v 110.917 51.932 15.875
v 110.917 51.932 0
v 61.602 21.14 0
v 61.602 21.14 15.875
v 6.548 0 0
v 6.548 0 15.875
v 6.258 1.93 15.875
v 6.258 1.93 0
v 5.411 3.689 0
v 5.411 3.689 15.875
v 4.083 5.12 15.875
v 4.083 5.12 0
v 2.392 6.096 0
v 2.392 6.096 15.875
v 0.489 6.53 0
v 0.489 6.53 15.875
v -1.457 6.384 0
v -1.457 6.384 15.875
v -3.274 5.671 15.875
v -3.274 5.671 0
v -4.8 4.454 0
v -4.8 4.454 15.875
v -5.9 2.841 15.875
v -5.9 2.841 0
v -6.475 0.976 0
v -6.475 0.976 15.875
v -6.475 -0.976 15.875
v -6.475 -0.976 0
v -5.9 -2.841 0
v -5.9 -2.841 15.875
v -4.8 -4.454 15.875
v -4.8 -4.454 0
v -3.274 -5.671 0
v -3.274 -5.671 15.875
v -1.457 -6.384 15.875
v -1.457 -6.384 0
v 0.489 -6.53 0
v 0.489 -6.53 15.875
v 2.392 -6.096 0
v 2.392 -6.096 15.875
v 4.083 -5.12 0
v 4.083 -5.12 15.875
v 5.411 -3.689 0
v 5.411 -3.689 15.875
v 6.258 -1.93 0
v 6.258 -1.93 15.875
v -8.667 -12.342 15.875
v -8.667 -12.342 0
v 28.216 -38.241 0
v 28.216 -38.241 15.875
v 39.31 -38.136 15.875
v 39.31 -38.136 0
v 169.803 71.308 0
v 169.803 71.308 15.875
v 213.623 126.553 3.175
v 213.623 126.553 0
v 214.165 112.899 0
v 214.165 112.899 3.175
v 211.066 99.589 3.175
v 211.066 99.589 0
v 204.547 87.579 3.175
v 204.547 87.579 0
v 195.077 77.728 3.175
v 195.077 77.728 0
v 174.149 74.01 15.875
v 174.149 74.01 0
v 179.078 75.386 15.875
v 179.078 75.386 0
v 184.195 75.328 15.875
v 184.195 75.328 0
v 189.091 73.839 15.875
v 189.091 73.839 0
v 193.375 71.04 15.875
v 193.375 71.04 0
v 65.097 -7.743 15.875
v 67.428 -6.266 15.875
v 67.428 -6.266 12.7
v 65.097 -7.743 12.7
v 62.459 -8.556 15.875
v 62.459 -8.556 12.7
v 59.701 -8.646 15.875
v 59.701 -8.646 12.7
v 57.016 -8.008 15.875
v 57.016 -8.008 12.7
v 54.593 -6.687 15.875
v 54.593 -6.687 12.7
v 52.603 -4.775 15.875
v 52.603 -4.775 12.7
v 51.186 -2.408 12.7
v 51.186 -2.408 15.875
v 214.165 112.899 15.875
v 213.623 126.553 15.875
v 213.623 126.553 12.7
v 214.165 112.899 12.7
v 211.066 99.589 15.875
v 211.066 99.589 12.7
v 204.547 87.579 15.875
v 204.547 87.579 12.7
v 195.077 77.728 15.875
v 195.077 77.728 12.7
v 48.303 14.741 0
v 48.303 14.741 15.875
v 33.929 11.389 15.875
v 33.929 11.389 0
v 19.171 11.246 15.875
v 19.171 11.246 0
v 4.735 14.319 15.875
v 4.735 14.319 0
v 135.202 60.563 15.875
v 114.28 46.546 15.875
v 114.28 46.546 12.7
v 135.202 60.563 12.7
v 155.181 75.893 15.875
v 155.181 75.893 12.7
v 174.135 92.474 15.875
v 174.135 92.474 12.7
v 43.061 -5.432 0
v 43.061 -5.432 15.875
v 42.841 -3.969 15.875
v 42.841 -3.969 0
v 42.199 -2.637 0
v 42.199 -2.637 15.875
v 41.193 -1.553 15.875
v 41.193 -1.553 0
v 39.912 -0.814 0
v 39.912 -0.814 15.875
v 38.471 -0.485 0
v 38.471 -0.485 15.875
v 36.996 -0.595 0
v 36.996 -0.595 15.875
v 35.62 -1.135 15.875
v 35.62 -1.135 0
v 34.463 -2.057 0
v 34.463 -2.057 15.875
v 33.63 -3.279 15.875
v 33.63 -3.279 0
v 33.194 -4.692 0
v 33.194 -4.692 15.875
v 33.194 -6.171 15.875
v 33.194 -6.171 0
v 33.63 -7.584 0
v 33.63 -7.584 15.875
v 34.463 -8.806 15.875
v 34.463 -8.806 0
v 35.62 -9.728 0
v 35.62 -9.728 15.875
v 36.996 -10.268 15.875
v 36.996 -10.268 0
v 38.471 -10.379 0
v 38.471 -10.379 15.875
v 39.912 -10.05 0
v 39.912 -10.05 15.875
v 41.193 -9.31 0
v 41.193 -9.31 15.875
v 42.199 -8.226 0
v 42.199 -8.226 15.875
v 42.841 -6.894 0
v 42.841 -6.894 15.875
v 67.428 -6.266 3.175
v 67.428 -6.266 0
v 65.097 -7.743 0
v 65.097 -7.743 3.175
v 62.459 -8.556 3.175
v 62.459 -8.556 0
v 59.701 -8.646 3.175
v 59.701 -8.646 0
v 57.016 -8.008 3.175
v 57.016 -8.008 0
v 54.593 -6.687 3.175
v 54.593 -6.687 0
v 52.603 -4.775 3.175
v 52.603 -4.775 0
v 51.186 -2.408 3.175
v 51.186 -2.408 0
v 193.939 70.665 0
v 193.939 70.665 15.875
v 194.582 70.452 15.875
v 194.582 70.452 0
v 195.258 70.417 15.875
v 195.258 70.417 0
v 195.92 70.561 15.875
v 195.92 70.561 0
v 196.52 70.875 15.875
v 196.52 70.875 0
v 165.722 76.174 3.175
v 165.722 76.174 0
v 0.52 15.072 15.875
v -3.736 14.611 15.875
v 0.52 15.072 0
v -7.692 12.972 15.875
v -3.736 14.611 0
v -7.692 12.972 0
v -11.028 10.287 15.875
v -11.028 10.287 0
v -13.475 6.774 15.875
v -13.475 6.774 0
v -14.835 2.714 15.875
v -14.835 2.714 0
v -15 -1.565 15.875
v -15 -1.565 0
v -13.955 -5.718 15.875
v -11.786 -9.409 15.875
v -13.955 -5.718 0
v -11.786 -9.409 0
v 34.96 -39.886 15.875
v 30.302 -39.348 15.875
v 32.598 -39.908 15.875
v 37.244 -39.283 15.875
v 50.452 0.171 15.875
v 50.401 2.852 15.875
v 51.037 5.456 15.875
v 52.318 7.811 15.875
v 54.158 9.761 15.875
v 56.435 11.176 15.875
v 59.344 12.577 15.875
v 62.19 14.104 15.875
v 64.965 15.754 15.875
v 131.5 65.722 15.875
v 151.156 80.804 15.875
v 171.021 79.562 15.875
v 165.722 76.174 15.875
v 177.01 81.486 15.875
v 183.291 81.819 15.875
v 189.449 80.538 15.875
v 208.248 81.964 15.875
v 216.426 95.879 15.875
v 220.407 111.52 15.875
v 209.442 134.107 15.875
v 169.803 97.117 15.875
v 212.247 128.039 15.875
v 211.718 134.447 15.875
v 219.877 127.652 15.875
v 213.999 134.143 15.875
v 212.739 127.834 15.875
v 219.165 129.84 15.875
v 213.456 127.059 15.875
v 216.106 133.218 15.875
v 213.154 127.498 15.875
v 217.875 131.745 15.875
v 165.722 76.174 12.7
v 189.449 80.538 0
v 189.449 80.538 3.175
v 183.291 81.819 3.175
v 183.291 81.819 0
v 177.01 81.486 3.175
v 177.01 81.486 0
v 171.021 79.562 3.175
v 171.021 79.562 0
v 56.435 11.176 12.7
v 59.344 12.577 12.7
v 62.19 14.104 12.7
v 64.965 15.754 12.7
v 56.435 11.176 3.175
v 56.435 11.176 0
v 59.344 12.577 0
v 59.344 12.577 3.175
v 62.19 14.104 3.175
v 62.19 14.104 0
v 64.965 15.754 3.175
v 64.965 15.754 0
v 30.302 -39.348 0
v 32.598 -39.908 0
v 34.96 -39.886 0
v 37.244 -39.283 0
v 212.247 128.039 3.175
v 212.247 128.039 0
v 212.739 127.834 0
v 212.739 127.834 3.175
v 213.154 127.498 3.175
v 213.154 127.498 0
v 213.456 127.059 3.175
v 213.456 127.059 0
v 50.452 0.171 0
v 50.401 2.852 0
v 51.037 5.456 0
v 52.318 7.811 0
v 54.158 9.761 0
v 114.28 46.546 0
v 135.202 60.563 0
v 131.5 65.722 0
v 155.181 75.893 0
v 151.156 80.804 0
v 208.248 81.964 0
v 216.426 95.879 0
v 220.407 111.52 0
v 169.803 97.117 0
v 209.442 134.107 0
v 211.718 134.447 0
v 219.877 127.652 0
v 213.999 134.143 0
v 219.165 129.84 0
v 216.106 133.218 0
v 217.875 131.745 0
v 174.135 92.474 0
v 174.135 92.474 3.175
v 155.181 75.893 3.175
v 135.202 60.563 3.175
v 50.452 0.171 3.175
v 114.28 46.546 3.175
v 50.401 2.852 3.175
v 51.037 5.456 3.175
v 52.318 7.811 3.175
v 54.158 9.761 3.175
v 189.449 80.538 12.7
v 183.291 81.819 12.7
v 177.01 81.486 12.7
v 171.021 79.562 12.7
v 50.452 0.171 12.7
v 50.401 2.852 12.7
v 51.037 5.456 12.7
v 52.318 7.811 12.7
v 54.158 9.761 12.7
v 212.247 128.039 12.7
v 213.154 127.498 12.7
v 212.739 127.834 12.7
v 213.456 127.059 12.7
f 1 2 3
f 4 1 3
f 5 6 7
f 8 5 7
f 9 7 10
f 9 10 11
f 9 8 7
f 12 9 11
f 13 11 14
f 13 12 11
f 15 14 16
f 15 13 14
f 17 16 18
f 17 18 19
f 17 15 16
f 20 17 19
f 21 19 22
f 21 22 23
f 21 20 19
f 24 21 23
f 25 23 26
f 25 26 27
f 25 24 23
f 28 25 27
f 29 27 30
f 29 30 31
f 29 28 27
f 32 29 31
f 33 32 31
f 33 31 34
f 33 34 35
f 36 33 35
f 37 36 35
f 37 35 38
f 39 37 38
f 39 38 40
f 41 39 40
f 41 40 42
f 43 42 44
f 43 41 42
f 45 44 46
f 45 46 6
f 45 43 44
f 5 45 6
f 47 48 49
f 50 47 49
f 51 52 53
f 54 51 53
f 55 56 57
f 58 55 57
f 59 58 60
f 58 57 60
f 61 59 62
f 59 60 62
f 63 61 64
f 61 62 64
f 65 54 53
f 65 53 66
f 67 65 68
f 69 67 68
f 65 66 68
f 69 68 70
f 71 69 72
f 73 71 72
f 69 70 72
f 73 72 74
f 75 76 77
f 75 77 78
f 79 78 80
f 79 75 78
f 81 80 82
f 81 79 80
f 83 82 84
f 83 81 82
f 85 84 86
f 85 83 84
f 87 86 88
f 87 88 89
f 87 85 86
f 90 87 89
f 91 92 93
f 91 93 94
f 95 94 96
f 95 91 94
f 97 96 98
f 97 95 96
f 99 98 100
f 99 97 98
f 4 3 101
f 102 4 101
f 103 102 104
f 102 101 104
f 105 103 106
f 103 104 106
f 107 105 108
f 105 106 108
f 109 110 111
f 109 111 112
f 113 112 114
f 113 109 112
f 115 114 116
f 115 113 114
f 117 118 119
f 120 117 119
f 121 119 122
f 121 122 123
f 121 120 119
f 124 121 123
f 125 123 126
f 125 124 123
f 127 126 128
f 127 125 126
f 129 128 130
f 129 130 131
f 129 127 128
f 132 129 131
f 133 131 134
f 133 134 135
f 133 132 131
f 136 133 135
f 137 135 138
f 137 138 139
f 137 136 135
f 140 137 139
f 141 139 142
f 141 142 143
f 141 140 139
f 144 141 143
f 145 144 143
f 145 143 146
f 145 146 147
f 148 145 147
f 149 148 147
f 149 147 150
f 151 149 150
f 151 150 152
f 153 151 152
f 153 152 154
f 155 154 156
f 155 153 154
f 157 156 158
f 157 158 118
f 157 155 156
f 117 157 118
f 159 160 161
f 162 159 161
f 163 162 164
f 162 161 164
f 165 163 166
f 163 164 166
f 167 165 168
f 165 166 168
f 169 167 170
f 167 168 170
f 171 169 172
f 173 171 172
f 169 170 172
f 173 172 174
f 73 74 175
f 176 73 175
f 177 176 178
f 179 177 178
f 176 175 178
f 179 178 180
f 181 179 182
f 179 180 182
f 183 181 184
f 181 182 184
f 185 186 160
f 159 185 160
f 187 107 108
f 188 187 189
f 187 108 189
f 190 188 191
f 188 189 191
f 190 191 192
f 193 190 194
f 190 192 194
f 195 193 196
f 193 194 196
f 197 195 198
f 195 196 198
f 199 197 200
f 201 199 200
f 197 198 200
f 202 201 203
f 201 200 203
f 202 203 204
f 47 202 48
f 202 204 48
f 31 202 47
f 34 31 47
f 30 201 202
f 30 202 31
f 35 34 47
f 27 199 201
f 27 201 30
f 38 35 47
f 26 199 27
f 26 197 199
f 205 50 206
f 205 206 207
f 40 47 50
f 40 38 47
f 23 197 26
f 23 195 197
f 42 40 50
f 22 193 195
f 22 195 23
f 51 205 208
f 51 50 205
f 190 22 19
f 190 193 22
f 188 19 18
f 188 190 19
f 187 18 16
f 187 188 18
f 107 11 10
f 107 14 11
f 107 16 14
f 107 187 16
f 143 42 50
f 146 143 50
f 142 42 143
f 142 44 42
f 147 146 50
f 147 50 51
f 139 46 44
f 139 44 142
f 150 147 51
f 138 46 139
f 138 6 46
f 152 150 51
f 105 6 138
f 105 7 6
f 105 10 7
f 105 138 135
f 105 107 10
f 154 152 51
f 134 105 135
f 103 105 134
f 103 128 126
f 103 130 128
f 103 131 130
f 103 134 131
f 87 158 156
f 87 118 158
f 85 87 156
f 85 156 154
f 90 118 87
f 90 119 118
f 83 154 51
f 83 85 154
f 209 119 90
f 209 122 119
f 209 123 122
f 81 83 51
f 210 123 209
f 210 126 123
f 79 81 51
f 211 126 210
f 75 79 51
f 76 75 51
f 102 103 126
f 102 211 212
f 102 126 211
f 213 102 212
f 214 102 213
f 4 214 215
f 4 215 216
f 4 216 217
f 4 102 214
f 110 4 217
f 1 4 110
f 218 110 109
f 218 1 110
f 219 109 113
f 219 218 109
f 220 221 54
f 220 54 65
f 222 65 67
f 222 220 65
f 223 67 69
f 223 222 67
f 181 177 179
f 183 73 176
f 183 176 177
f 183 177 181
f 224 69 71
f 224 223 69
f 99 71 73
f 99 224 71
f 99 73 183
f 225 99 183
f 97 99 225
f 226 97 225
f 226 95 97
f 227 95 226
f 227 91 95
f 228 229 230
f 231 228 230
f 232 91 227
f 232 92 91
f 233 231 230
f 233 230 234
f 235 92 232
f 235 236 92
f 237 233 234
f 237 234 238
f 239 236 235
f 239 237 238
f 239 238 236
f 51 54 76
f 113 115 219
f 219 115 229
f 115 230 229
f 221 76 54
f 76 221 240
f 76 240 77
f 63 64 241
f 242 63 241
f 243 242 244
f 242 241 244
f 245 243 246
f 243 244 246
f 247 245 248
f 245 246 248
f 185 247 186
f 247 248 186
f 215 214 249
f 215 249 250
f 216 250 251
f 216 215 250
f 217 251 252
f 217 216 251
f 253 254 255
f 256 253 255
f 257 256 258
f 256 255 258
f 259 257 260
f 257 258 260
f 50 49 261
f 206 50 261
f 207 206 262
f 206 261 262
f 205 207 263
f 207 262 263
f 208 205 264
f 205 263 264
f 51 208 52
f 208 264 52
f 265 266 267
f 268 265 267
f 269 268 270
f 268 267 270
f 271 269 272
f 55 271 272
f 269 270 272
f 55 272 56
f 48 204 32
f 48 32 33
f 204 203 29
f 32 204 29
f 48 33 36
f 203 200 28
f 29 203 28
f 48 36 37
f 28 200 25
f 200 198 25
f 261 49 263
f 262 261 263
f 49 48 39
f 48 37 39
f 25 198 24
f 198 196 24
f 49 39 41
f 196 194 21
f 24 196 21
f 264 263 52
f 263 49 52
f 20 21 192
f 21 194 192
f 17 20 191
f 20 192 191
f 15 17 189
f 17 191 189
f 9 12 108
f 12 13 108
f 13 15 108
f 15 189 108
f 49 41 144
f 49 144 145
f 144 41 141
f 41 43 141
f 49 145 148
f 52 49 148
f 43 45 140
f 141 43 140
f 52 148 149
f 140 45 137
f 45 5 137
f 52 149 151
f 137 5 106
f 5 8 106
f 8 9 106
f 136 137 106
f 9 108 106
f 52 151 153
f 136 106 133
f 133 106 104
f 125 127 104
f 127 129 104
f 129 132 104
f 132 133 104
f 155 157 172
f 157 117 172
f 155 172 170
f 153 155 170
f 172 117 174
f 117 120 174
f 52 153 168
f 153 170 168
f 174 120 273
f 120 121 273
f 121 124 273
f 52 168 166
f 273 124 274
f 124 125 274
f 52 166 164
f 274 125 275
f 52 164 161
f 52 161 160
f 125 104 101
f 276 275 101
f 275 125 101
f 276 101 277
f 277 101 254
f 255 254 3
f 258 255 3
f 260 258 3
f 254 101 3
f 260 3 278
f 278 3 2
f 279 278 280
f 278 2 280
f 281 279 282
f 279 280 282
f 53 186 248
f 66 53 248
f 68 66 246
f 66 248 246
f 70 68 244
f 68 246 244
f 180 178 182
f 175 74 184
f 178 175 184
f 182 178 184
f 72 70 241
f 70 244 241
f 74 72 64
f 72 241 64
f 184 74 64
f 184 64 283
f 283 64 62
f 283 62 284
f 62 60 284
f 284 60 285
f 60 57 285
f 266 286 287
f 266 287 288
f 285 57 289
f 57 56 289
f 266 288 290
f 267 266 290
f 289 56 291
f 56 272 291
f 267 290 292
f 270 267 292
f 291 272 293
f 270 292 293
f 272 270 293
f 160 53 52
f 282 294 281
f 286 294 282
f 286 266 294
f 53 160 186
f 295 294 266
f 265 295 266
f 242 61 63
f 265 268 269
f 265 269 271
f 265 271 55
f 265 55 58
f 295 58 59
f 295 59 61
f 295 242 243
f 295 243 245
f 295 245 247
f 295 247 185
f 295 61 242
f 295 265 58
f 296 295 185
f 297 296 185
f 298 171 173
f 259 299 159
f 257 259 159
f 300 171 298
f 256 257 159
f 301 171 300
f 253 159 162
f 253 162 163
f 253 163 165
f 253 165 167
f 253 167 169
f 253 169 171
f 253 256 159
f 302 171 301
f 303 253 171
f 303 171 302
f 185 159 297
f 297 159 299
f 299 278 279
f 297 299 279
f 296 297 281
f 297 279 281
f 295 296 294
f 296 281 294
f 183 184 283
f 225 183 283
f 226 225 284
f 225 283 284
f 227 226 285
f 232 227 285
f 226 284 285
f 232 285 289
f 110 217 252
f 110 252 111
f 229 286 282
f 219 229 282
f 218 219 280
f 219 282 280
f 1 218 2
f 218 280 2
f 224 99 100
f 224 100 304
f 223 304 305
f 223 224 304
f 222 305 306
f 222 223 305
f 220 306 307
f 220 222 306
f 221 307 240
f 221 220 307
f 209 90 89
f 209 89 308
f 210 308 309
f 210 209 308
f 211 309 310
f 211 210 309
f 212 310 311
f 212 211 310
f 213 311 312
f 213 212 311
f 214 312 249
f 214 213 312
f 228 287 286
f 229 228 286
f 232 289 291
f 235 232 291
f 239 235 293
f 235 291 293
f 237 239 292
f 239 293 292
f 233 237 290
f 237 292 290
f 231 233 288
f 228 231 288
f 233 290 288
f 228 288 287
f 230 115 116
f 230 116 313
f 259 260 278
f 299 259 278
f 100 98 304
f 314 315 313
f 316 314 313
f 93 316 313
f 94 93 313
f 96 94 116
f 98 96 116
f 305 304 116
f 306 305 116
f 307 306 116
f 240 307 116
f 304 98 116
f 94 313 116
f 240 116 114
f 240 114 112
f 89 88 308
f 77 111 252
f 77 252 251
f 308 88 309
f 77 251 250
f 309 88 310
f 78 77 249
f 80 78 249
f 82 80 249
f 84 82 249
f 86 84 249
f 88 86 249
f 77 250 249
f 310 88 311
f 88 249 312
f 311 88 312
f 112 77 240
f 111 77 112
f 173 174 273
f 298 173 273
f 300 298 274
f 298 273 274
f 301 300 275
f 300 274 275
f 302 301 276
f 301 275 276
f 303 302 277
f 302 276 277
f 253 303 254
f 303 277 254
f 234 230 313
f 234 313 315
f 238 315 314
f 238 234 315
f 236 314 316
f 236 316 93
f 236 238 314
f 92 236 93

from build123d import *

# Parameters (mm, degrees)
SKETCH1_R           = 6.5484375
SKETCH1_R_2         = 4.9609375
BOSS_EXTRUDE1_DEPTH = 15.875
CUT_EXTRUDE1_DEPTH  = 3.175


with BuildPart() as part:
    # Sketch1 → Boss-Extrude1 (new body)
    with BuildSketch(Plane.XY):
        with BuildLine():
            Line((39.309837535, -38.13576648), (169.802643178, 71.308446723))
            ThreePointArc((169.802643178, 71.308446723), (181.638701023, 75.538599133), (193.375235205, 71.039685917))
            ThreePointArc((193.375235205, 71.039685917), (194.91888163, 70.411561678), (196.519579076, 70.875406513))
            ThreePointArc((196.519579076, 70.875406513), (216.426062494, 95.878722868), (219.876867623, 127.651759468))
            ThreePointArc((219.876867623, 127.651759468), (216.10638338, 133.218163447), (209.442132072, 134.106509769))
            Line((209.442132072, 134.106509769), (169.802643178, 97.116806131))
            ThreePointArc((169.802643178, 97.116806131), (141.448926781, 73.105263596), (110.917160699, 51.932198905))
            Line((110.917160699, 51.932198905), (61.60231529, 21.139969158))
            ThreePointArc((61.60231529, 21.139969158), (33.929413541, 11.389122801), (4.735454932, 14.318504397))
            ThreePointArc((4.735454932, 14.318504397), (-13.47453995, 6.773542256), (-8.666712343, -12.34229309))
            Line((-8.666712343, -12.34229309), (28.215623228, -38.240932071))
            ThreePointArc((28.215623228, -38.240932071), (33.77962274, -39.970371676), (39.309837535, -38.13576648))
        make_face()
        Circle(SKETCH1_R, mode=Mode.SUBTRACT)
        with Locations((38.1, -5.431682667)):
            Circle(SKETCH1_R_2, mode=Mode.SUBTRACT)
    extrude(amount=BOSS_EXTRUDE1_DEPTH)

    # Sketch2 → Cut-Extrude1 (cut)
    with BuildSketch(Plane(origin=(0, 0, 0), x_dir=(-1, 0, 0), z_dir=(0, 0, -1))):
        with BuildLine():
            Line((-174.134916332, 92.474187331), (-212.247088608, 128.038671053))
            ThreePointArc((-212.247088608, 128.038671053), (-213.153727633, 127.498423524), (-213.622663407, 126.552928441))
            ThreePointArc((-213.622663407, 126.552928441), (-211.065734224, 99.589440169), (-195.076715953, 77.728084278))
            ThreePointArc((-195.076715953, 77.728084278), (-180.13970514, 81.855576515), (-165.722085208, 76.173788093))
            Line((-165.722085208, 76.173788093), (-67.427567629, -6.265746298))
            ThreePointArc((-67.427567629, -6.265746298), (-58.337399342, -8.416558755), (-51.185588969, -2.40750208))
            ThreePointArc((-51.185588969, -2.40750208), (-51.037402279, 5.455937622), (-56.434934077, 11.176277972))
            ThreePointArc((-56.434934077, 11.176277972), (-60.775393958, 13.324892332), (-64.965487459, 15.753729935))
            Line((-64.965487459, 15.753729935), (-114.280332868, 46.545959683))
            ThreePointArc((-114.280332868, 46.545959683), (-145.314571941, 68.067477625), (-174.134916332, 92.474187331))
        make_face()
    cut_extrude1 = extrude(amount=-CUT_EXTRUDE1_DEPTH, mode=Mode.SUBTRACT)

    # Mirror1: Cut-Extrude1 across plane
    add(cut_extrude1.mirror(Plane(origin=(0, 0, 7.9375), x_dir=(1, 0, 0), z_dir=(0, 0, -1))), mode=Mode.SUBTRACT)


solid = part.part
